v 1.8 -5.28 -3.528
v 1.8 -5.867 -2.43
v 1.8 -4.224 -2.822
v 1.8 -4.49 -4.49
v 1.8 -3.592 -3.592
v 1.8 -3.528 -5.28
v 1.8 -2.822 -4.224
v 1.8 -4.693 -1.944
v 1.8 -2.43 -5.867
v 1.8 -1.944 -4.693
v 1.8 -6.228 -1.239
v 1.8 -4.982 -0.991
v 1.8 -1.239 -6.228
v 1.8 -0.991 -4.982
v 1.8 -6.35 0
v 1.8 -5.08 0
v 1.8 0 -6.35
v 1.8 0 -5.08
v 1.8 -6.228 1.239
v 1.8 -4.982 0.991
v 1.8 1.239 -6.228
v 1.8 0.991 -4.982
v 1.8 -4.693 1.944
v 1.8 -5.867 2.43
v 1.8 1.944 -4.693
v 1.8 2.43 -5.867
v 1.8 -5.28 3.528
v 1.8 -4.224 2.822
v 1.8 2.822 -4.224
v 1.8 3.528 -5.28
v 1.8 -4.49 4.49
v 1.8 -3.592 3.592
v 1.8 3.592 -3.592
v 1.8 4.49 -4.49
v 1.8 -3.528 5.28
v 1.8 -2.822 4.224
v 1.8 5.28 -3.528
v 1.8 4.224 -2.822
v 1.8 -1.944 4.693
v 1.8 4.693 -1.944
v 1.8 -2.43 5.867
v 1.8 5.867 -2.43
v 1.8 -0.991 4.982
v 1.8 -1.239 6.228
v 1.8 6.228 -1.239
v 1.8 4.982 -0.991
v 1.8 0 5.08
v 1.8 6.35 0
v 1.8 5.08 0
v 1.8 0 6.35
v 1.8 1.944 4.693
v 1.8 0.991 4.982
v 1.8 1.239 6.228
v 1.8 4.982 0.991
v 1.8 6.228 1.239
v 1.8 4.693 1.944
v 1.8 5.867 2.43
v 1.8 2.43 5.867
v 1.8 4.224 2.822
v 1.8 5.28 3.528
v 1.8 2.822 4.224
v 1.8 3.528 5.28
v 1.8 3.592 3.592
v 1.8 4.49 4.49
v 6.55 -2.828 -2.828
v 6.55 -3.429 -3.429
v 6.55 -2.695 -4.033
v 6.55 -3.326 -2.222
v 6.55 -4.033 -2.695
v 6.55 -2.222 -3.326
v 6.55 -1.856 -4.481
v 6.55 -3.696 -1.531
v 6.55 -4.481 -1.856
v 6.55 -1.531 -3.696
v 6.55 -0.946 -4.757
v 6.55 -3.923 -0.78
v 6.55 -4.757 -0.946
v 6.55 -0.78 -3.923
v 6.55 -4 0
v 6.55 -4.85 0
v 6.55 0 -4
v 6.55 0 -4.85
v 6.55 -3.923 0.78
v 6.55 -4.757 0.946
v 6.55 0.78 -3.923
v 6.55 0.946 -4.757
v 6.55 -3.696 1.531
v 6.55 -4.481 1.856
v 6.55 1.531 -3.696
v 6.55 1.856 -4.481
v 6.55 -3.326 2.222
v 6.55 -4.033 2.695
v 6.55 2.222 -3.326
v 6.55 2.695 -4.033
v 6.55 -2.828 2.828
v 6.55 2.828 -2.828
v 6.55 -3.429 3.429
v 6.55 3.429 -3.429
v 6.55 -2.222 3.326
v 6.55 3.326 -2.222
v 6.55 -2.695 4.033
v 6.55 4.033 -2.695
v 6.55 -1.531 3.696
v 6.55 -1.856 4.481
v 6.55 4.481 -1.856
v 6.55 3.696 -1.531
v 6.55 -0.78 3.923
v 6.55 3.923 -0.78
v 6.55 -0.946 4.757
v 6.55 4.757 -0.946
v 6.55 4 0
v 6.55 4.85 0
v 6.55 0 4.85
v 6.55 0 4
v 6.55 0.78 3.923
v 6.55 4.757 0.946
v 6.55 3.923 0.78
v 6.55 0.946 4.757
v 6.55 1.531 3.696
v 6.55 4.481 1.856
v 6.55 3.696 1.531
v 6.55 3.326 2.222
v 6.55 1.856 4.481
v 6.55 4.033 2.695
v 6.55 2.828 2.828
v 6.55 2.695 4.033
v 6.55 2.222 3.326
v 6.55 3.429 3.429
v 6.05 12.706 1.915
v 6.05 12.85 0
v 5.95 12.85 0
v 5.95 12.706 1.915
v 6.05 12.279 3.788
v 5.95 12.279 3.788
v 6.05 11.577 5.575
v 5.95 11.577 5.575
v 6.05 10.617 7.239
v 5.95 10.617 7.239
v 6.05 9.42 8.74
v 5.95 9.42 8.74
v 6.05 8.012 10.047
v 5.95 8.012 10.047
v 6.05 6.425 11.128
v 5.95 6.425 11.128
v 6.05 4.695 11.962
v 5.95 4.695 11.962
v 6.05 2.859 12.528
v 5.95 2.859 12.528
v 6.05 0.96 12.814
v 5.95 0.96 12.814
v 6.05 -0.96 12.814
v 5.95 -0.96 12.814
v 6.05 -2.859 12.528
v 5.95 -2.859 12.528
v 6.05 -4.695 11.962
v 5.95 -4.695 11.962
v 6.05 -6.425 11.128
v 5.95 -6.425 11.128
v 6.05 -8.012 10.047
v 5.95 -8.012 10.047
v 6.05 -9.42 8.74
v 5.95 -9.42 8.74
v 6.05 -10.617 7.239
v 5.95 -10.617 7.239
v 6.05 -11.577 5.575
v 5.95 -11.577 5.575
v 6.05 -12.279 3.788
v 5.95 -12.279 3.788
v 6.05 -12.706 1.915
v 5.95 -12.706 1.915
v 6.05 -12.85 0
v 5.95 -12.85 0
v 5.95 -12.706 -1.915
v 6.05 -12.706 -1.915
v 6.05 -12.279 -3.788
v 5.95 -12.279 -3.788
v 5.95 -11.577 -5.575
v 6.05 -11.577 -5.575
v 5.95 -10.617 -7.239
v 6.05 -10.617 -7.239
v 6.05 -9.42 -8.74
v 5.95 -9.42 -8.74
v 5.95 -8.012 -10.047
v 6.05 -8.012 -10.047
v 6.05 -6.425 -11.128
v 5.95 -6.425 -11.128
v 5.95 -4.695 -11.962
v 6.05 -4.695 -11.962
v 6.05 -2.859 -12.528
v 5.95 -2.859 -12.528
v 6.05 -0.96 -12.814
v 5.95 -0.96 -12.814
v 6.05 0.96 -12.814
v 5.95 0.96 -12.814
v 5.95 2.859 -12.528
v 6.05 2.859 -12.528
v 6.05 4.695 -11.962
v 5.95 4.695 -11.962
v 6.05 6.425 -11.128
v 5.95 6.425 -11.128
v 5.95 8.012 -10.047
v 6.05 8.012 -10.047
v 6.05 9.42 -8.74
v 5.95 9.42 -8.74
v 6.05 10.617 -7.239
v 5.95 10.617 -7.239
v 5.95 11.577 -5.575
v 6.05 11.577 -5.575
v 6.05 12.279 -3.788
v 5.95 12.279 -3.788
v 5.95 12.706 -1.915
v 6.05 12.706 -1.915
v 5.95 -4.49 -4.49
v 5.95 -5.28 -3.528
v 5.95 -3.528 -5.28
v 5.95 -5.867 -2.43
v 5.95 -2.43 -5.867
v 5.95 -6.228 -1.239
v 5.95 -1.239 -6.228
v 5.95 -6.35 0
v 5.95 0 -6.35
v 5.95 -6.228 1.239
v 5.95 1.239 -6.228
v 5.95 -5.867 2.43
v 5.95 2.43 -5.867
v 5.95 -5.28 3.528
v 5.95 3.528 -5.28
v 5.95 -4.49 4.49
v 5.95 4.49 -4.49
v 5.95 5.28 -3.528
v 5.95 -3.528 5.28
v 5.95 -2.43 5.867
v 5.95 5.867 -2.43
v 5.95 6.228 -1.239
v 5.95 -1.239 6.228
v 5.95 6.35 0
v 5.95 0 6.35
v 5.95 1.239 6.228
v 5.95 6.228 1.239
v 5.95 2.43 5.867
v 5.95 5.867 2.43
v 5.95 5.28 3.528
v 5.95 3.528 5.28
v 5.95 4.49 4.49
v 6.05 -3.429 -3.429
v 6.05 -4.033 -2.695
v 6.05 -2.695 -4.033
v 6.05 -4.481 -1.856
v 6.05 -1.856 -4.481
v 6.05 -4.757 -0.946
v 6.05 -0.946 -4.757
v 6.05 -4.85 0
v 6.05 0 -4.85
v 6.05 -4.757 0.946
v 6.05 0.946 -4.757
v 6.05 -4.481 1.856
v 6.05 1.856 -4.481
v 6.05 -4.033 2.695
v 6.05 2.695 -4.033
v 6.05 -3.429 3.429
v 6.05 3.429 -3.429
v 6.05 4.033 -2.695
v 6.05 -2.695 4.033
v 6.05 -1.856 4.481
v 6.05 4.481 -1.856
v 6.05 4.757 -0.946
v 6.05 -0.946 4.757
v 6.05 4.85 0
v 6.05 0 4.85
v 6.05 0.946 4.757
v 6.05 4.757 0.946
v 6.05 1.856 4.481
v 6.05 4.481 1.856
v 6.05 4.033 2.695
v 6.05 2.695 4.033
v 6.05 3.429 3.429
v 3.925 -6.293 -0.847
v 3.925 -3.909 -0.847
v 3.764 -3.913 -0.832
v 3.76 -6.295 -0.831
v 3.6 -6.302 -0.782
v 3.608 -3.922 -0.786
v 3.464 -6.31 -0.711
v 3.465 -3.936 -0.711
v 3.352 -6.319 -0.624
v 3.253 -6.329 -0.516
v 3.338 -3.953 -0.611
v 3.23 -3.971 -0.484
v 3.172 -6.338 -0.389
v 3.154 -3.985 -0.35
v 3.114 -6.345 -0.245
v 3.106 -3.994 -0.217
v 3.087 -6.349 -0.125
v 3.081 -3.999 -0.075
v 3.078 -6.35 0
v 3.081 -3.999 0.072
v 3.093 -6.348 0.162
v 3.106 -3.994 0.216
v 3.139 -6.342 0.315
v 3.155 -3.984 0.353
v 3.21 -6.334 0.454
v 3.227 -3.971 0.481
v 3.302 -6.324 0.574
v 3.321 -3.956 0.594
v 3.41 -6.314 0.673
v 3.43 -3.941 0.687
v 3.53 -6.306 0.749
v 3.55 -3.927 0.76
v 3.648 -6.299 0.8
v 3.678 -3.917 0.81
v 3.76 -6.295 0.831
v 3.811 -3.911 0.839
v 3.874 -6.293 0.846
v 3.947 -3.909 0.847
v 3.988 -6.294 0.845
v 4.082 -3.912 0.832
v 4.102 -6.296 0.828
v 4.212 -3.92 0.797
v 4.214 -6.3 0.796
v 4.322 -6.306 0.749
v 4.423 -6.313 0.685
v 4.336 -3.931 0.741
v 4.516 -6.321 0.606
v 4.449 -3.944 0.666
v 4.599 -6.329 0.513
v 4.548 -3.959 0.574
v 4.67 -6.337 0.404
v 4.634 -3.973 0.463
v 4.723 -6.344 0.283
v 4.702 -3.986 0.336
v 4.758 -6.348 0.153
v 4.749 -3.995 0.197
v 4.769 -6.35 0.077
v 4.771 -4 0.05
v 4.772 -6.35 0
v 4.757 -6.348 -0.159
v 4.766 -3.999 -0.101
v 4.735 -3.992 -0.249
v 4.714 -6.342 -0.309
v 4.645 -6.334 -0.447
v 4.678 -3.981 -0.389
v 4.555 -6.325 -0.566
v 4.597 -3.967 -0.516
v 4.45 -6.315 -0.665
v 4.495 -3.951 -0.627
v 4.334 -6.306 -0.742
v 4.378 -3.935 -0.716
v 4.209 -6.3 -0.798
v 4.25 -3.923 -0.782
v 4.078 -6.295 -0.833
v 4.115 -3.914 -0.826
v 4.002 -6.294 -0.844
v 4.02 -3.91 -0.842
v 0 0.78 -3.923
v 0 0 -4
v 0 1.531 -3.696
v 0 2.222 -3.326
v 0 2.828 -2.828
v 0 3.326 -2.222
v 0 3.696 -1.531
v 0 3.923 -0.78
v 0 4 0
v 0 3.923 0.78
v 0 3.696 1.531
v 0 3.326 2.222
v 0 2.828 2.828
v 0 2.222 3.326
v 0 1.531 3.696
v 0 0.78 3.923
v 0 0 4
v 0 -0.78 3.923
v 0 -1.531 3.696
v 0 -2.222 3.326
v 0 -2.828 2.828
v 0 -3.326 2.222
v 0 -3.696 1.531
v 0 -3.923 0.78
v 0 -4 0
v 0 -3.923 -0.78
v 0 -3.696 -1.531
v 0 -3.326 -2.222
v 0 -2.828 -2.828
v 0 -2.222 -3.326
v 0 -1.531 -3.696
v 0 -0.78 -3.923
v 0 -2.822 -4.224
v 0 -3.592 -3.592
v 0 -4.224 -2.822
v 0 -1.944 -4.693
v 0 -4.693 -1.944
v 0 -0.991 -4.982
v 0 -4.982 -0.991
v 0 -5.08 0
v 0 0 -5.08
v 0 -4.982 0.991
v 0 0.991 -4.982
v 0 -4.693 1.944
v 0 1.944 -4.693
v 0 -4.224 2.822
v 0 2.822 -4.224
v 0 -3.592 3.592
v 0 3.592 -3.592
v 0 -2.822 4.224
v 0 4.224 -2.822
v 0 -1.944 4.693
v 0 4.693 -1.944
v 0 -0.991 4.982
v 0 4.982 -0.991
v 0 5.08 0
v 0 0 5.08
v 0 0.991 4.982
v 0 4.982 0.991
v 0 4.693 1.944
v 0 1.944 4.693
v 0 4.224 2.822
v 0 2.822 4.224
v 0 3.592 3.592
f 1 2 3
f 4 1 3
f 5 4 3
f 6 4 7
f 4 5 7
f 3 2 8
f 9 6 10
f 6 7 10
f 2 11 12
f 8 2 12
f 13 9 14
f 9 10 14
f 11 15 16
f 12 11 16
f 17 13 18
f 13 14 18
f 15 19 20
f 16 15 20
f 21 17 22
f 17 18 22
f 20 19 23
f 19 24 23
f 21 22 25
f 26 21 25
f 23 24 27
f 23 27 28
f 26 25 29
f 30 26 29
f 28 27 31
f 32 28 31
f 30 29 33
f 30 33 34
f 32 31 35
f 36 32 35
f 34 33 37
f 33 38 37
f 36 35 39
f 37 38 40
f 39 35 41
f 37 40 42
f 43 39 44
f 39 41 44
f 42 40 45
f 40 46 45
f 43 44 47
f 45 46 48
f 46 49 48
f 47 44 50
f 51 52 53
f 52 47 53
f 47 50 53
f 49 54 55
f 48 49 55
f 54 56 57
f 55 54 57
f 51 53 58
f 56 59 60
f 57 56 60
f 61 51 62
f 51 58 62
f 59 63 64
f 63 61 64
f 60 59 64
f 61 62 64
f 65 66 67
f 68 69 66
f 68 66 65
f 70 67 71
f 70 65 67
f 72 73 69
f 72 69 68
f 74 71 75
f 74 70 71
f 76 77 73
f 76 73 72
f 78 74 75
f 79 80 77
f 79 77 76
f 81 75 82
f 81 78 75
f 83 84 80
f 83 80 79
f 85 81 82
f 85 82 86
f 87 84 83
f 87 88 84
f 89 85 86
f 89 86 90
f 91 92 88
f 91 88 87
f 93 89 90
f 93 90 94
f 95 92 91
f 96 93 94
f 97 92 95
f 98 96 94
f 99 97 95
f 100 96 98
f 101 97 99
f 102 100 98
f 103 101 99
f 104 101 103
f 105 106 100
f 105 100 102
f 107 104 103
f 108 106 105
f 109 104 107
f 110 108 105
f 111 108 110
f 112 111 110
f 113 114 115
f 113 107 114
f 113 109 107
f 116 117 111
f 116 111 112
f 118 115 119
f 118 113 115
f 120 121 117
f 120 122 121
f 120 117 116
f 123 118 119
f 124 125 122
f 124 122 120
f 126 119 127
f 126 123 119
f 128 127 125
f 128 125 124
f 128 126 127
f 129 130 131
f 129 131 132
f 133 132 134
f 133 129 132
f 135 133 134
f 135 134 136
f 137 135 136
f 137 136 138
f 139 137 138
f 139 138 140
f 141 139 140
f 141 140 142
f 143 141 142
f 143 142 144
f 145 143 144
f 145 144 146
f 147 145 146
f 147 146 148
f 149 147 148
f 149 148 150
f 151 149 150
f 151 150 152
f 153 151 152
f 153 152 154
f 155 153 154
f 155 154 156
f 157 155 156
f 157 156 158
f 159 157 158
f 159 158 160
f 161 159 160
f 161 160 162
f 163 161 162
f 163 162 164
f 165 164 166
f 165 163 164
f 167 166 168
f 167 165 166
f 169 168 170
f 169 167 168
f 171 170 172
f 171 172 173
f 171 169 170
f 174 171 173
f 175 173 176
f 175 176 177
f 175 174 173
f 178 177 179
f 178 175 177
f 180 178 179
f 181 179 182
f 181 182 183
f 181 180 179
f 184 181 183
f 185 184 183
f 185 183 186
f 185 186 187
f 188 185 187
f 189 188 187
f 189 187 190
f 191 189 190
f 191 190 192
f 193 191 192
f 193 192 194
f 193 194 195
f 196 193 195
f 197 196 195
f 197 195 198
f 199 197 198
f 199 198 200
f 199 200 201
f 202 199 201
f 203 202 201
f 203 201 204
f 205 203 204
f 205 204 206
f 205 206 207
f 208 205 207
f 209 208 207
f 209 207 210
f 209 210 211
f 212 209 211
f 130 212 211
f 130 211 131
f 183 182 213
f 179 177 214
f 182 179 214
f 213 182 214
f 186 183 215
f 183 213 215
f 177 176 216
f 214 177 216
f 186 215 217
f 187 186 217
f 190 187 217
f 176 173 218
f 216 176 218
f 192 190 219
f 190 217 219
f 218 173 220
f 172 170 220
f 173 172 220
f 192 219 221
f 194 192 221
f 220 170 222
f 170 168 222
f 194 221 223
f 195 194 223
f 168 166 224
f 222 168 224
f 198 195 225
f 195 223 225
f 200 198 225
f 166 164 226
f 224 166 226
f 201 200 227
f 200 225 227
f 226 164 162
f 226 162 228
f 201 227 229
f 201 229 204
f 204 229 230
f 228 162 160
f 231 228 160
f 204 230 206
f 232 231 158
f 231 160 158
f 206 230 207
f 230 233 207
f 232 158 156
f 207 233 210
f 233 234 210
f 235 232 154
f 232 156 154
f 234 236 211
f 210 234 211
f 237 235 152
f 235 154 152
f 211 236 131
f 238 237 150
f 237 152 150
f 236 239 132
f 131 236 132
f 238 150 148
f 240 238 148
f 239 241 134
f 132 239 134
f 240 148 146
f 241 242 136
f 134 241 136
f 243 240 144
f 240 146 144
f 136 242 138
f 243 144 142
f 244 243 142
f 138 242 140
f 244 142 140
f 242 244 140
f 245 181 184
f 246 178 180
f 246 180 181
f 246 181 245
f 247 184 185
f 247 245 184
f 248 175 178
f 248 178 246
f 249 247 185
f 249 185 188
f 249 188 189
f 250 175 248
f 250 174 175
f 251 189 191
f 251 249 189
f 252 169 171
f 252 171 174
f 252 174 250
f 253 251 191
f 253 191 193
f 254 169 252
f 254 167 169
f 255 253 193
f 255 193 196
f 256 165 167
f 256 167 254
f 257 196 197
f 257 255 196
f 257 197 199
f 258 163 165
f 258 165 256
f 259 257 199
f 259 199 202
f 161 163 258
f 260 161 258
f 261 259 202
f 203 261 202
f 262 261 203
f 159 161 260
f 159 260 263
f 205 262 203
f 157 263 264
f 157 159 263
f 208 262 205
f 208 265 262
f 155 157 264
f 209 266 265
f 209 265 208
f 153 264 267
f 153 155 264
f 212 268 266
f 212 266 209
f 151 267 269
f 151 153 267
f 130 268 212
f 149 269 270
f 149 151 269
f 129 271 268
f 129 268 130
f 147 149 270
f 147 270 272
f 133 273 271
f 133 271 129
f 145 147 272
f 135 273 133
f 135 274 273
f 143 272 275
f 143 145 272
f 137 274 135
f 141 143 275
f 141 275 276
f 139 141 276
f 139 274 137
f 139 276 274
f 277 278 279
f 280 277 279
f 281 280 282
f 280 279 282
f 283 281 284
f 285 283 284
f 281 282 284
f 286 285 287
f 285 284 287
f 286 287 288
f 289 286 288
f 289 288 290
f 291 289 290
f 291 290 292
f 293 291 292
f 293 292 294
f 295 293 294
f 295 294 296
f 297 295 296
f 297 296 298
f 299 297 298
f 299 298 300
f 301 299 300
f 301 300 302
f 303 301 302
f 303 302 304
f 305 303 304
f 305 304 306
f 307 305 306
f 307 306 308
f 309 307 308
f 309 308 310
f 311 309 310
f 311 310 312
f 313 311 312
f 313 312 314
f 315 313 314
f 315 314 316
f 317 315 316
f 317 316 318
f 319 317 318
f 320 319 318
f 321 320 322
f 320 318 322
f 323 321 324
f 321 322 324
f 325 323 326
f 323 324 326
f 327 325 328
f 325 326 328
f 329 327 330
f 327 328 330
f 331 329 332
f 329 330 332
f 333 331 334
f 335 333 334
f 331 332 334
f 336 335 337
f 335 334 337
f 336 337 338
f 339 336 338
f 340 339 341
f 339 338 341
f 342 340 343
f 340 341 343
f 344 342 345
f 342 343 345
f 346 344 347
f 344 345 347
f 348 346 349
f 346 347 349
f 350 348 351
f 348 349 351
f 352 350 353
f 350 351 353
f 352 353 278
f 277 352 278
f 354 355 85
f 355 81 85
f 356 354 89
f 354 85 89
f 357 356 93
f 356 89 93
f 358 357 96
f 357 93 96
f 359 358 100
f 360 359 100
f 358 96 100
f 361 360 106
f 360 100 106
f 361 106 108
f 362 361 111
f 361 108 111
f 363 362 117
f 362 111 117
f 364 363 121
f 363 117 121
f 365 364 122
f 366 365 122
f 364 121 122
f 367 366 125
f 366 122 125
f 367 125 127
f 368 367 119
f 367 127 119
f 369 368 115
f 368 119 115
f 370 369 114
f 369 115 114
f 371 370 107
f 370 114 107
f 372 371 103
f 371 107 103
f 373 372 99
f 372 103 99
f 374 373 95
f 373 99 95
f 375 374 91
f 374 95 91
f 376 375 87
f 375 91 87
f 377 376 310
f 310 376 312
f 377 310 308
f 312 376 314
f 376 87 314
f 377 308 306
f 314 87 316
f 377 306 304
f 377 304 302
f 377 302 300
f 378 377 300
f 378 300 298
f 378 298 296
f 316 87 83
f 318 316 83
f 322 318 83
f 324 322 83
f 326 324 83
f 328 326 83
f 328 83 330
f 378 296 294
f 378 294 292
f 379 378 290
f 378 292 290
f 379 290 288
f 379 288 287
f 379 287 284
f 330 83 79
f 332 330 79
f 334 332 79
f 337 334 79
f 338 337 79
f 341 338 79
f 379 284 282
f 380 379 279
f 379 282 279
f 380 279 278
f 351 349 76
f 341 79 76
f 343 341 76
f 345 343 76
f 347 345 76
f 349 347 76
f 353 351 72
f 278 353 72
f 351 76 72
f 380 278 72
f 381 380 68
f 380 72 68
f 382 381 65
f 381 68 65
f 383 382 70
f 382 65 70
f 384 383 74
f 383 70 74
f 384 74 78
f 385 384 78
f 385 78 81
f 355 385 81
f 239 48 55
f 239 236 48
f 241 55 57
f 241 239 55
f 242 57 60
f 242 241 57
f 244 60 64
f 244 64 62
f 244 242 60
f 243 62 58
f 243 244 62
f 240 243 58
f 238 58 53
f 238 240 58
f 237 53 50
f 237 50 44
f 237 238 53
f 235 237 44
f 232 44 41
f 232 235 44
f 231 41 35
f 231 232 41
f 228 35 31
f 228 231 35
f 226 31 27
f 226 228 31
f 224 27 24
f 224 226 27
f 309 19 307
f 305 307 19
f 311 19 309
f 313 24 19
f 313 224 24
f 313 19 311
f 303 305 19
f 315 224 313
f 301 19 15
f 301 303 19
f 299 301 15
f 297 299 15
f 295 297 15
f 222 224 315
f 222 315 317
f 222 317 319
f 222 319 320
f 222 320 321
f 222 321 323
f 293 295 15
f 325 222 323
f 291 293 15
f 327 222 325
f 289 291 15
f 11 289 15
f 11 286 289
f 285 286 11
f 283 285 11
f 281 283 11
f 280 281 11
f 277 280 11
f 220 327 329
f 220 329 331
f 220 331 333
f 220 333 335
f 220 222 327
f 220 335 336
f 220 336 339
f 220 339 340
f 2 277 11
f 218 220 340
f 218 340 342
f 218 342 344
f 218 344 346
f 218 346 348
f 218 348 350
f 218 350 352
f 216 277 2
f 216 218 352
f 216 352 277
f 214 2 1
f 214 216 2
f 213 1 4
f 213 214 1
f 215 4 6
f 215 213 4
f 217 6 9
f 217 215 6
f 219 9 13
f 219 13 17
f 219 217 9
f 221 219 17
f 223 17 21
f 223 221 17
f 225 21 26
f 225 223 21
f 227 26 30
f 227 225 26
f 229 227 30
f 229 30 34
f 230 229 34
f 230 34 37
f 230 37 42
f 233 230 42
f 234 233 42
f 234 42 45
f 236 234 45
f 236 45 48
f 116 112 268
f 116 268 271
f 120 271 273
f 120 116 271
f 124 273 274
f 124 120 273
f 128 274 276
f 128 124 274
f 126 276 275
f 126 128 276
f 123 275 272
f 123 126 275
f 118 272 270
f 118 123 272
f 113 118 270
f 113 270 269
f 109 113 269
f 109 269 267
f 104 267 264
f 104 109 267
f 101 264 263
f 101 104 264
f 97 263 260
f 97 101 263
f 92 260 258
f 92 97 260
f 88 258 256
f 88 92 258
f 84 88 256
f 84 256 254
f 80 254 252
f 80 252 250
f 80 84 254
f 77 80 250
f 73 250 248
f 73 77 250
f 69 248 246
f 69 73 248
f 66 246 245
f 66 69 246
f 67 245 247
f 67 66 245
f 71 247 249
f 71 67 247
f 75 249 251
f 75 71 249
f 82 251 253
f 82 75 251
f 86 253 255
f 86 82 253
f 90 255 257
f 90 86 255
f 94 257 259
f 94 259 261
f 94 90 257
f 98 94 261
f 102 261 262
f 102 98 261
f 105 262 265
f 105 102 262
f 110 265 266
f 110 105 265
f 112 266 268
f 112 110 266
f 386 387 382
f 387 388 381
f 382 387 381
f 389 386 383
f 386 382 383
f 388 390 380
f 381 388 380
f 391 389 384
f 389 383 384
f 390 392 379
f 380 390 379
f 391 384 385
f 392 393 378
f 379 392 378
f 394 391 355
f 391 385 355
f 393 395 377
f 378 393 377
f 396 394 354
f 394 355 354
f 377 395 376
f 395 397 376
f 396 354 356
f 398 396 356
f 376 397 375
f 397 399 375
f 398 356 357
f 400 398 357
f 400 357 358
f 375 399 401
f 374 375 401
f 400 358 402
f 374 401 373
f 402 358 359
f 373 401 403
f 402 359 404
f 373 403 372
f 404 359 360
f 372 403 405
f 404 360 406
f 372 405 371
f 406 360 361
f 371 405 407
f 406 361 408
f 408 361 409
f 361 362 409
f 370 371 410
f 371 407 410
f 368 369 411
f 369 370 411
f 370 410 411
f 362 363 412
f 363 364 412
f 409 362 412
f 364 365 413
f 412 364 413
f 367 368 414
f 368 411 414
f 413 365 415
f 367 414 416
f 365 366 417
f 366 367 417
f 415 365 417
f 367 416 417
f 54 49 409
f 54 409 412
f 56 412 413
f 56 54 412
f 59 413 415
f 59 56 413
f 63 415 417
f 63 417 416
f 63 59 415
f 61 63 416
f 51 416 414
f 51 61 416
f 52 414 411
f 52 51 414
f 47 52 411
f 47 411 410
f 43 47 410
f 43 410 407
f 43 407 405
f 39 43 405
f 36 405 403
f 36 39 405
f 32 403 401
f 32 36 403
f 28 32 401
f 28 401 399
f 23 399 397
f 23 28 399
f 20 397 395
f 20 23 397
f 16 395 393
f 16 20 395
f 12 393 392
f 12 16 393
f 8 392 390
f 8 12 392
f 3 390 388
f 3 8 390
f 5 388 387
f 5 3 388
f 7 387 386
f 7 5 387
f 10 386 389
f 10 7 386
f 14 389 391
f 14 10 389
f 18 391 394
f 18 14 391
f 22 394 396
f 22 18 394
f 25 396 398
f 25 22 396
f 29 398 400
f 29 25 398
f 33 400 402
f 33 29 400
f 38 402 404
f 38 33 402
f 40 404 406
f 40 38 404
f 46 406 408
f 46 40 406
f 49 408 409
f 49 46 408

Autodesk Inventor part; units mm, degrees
ref_plane "YZ Plane" through (0, 0, 0) normal (1, 0, 0) x (0, 1, 0)
ref_plane "XZ Plane" through (0, 0, 0) normal (0, 1, 0) x (-1, 0, 0)
ref_plane "XY Plane" through (0, 0, 0) normal (0, 0, 1) x (1, 0, 0)
sketch "Sketch1" plane through (0, 0, 0) normal (0, 0, 1) x (1, 0, 0)
  line L0 (0, 0) -> (0, 5.08)
  line L1 (0, 5.08) -> (1.8, 5.08)
  line L2 (1.8, 5.08) -> (1.8, 6.35)
  line L3 (1.8, 6.35) -> (5.95, 6.35)
  line L4 (5.95, 6.35) -> (5.95, 12.85)
  line L5 (5.95, 12.85) -> (6.05, 12.85)
  line L6 (6.05, 12.85) -> (6.05, 4.85)
  line L7 (6.05, 4.85) -> (6.55, 4.85)
  line L8 (6.55, 4.85) -> (6.55, 0)
  line L9 (0, 0) -> (11.8727, 0) construction
  line L10 (0, 0) -> (6.55, 0)
  dimension "d0" = 5.08
  dimension "d1" = 1.8
  dimension "d2" = 1.27
  dimension "d3" = 4.15
  dimension "d4" = 6.5
  dimension "d5" = 0.1
  dimension "d6" = 8
  dimension "d7" = 0.5
revolve "Revolution1" add sketch "Sketch1" angle 360 about axis through (0, 0, 0) along (1, 0, 0)
sketch "Sketch2" plane through (6.55, 0, 0) normal (1, 0, 0) x (0, 0, -1)
  circle A0 centre (0, 0) radius 4
  dimension "d9" = 8
extrude "Extrusion1" cut sketch "Sketch2" against normal blind 10
sketch "Sketch3" plane through (1.8, 0, 0) normal (-1, 0, 0) x (0, 0, 1)
  circle A0 centre (0, 0) radius 6.35 projected
  point P0 (0, -6.35)
ref_plane "Work Plane1" through (1.8, -6.35, 0) normal (0, -1, 0) x (1, 0, 0)
sketch "Sketch4" plane through (1.8, -6.35, 0) normal (0, -1, 0) x (1, 0, 0)
  circle A0 centre (2.125, 0) radius 1.5
  line L0 (4.25, -12.85) -> (4.25, 12.85) projected
  line L1 (0, -6.35) -> (0, 6.35) projected
  point P0 (-1.8, 0)
  dimension "d12" = 3
  dimension "d14" = 4.25
  dimension "d15" = 2.125
hole "Hole1" at (3.925, -6.35, 0) direction (0, 1, 0) diameter 1.6942 depth 6.637 tip angle 118 thread size "2-56 UNC" class "2B" standard "ANSI Unified Screw Threads"
equation "\"d15\" = 0.5 * d14"
properties part number "Tarcza impulsowa HEDS-5140"
